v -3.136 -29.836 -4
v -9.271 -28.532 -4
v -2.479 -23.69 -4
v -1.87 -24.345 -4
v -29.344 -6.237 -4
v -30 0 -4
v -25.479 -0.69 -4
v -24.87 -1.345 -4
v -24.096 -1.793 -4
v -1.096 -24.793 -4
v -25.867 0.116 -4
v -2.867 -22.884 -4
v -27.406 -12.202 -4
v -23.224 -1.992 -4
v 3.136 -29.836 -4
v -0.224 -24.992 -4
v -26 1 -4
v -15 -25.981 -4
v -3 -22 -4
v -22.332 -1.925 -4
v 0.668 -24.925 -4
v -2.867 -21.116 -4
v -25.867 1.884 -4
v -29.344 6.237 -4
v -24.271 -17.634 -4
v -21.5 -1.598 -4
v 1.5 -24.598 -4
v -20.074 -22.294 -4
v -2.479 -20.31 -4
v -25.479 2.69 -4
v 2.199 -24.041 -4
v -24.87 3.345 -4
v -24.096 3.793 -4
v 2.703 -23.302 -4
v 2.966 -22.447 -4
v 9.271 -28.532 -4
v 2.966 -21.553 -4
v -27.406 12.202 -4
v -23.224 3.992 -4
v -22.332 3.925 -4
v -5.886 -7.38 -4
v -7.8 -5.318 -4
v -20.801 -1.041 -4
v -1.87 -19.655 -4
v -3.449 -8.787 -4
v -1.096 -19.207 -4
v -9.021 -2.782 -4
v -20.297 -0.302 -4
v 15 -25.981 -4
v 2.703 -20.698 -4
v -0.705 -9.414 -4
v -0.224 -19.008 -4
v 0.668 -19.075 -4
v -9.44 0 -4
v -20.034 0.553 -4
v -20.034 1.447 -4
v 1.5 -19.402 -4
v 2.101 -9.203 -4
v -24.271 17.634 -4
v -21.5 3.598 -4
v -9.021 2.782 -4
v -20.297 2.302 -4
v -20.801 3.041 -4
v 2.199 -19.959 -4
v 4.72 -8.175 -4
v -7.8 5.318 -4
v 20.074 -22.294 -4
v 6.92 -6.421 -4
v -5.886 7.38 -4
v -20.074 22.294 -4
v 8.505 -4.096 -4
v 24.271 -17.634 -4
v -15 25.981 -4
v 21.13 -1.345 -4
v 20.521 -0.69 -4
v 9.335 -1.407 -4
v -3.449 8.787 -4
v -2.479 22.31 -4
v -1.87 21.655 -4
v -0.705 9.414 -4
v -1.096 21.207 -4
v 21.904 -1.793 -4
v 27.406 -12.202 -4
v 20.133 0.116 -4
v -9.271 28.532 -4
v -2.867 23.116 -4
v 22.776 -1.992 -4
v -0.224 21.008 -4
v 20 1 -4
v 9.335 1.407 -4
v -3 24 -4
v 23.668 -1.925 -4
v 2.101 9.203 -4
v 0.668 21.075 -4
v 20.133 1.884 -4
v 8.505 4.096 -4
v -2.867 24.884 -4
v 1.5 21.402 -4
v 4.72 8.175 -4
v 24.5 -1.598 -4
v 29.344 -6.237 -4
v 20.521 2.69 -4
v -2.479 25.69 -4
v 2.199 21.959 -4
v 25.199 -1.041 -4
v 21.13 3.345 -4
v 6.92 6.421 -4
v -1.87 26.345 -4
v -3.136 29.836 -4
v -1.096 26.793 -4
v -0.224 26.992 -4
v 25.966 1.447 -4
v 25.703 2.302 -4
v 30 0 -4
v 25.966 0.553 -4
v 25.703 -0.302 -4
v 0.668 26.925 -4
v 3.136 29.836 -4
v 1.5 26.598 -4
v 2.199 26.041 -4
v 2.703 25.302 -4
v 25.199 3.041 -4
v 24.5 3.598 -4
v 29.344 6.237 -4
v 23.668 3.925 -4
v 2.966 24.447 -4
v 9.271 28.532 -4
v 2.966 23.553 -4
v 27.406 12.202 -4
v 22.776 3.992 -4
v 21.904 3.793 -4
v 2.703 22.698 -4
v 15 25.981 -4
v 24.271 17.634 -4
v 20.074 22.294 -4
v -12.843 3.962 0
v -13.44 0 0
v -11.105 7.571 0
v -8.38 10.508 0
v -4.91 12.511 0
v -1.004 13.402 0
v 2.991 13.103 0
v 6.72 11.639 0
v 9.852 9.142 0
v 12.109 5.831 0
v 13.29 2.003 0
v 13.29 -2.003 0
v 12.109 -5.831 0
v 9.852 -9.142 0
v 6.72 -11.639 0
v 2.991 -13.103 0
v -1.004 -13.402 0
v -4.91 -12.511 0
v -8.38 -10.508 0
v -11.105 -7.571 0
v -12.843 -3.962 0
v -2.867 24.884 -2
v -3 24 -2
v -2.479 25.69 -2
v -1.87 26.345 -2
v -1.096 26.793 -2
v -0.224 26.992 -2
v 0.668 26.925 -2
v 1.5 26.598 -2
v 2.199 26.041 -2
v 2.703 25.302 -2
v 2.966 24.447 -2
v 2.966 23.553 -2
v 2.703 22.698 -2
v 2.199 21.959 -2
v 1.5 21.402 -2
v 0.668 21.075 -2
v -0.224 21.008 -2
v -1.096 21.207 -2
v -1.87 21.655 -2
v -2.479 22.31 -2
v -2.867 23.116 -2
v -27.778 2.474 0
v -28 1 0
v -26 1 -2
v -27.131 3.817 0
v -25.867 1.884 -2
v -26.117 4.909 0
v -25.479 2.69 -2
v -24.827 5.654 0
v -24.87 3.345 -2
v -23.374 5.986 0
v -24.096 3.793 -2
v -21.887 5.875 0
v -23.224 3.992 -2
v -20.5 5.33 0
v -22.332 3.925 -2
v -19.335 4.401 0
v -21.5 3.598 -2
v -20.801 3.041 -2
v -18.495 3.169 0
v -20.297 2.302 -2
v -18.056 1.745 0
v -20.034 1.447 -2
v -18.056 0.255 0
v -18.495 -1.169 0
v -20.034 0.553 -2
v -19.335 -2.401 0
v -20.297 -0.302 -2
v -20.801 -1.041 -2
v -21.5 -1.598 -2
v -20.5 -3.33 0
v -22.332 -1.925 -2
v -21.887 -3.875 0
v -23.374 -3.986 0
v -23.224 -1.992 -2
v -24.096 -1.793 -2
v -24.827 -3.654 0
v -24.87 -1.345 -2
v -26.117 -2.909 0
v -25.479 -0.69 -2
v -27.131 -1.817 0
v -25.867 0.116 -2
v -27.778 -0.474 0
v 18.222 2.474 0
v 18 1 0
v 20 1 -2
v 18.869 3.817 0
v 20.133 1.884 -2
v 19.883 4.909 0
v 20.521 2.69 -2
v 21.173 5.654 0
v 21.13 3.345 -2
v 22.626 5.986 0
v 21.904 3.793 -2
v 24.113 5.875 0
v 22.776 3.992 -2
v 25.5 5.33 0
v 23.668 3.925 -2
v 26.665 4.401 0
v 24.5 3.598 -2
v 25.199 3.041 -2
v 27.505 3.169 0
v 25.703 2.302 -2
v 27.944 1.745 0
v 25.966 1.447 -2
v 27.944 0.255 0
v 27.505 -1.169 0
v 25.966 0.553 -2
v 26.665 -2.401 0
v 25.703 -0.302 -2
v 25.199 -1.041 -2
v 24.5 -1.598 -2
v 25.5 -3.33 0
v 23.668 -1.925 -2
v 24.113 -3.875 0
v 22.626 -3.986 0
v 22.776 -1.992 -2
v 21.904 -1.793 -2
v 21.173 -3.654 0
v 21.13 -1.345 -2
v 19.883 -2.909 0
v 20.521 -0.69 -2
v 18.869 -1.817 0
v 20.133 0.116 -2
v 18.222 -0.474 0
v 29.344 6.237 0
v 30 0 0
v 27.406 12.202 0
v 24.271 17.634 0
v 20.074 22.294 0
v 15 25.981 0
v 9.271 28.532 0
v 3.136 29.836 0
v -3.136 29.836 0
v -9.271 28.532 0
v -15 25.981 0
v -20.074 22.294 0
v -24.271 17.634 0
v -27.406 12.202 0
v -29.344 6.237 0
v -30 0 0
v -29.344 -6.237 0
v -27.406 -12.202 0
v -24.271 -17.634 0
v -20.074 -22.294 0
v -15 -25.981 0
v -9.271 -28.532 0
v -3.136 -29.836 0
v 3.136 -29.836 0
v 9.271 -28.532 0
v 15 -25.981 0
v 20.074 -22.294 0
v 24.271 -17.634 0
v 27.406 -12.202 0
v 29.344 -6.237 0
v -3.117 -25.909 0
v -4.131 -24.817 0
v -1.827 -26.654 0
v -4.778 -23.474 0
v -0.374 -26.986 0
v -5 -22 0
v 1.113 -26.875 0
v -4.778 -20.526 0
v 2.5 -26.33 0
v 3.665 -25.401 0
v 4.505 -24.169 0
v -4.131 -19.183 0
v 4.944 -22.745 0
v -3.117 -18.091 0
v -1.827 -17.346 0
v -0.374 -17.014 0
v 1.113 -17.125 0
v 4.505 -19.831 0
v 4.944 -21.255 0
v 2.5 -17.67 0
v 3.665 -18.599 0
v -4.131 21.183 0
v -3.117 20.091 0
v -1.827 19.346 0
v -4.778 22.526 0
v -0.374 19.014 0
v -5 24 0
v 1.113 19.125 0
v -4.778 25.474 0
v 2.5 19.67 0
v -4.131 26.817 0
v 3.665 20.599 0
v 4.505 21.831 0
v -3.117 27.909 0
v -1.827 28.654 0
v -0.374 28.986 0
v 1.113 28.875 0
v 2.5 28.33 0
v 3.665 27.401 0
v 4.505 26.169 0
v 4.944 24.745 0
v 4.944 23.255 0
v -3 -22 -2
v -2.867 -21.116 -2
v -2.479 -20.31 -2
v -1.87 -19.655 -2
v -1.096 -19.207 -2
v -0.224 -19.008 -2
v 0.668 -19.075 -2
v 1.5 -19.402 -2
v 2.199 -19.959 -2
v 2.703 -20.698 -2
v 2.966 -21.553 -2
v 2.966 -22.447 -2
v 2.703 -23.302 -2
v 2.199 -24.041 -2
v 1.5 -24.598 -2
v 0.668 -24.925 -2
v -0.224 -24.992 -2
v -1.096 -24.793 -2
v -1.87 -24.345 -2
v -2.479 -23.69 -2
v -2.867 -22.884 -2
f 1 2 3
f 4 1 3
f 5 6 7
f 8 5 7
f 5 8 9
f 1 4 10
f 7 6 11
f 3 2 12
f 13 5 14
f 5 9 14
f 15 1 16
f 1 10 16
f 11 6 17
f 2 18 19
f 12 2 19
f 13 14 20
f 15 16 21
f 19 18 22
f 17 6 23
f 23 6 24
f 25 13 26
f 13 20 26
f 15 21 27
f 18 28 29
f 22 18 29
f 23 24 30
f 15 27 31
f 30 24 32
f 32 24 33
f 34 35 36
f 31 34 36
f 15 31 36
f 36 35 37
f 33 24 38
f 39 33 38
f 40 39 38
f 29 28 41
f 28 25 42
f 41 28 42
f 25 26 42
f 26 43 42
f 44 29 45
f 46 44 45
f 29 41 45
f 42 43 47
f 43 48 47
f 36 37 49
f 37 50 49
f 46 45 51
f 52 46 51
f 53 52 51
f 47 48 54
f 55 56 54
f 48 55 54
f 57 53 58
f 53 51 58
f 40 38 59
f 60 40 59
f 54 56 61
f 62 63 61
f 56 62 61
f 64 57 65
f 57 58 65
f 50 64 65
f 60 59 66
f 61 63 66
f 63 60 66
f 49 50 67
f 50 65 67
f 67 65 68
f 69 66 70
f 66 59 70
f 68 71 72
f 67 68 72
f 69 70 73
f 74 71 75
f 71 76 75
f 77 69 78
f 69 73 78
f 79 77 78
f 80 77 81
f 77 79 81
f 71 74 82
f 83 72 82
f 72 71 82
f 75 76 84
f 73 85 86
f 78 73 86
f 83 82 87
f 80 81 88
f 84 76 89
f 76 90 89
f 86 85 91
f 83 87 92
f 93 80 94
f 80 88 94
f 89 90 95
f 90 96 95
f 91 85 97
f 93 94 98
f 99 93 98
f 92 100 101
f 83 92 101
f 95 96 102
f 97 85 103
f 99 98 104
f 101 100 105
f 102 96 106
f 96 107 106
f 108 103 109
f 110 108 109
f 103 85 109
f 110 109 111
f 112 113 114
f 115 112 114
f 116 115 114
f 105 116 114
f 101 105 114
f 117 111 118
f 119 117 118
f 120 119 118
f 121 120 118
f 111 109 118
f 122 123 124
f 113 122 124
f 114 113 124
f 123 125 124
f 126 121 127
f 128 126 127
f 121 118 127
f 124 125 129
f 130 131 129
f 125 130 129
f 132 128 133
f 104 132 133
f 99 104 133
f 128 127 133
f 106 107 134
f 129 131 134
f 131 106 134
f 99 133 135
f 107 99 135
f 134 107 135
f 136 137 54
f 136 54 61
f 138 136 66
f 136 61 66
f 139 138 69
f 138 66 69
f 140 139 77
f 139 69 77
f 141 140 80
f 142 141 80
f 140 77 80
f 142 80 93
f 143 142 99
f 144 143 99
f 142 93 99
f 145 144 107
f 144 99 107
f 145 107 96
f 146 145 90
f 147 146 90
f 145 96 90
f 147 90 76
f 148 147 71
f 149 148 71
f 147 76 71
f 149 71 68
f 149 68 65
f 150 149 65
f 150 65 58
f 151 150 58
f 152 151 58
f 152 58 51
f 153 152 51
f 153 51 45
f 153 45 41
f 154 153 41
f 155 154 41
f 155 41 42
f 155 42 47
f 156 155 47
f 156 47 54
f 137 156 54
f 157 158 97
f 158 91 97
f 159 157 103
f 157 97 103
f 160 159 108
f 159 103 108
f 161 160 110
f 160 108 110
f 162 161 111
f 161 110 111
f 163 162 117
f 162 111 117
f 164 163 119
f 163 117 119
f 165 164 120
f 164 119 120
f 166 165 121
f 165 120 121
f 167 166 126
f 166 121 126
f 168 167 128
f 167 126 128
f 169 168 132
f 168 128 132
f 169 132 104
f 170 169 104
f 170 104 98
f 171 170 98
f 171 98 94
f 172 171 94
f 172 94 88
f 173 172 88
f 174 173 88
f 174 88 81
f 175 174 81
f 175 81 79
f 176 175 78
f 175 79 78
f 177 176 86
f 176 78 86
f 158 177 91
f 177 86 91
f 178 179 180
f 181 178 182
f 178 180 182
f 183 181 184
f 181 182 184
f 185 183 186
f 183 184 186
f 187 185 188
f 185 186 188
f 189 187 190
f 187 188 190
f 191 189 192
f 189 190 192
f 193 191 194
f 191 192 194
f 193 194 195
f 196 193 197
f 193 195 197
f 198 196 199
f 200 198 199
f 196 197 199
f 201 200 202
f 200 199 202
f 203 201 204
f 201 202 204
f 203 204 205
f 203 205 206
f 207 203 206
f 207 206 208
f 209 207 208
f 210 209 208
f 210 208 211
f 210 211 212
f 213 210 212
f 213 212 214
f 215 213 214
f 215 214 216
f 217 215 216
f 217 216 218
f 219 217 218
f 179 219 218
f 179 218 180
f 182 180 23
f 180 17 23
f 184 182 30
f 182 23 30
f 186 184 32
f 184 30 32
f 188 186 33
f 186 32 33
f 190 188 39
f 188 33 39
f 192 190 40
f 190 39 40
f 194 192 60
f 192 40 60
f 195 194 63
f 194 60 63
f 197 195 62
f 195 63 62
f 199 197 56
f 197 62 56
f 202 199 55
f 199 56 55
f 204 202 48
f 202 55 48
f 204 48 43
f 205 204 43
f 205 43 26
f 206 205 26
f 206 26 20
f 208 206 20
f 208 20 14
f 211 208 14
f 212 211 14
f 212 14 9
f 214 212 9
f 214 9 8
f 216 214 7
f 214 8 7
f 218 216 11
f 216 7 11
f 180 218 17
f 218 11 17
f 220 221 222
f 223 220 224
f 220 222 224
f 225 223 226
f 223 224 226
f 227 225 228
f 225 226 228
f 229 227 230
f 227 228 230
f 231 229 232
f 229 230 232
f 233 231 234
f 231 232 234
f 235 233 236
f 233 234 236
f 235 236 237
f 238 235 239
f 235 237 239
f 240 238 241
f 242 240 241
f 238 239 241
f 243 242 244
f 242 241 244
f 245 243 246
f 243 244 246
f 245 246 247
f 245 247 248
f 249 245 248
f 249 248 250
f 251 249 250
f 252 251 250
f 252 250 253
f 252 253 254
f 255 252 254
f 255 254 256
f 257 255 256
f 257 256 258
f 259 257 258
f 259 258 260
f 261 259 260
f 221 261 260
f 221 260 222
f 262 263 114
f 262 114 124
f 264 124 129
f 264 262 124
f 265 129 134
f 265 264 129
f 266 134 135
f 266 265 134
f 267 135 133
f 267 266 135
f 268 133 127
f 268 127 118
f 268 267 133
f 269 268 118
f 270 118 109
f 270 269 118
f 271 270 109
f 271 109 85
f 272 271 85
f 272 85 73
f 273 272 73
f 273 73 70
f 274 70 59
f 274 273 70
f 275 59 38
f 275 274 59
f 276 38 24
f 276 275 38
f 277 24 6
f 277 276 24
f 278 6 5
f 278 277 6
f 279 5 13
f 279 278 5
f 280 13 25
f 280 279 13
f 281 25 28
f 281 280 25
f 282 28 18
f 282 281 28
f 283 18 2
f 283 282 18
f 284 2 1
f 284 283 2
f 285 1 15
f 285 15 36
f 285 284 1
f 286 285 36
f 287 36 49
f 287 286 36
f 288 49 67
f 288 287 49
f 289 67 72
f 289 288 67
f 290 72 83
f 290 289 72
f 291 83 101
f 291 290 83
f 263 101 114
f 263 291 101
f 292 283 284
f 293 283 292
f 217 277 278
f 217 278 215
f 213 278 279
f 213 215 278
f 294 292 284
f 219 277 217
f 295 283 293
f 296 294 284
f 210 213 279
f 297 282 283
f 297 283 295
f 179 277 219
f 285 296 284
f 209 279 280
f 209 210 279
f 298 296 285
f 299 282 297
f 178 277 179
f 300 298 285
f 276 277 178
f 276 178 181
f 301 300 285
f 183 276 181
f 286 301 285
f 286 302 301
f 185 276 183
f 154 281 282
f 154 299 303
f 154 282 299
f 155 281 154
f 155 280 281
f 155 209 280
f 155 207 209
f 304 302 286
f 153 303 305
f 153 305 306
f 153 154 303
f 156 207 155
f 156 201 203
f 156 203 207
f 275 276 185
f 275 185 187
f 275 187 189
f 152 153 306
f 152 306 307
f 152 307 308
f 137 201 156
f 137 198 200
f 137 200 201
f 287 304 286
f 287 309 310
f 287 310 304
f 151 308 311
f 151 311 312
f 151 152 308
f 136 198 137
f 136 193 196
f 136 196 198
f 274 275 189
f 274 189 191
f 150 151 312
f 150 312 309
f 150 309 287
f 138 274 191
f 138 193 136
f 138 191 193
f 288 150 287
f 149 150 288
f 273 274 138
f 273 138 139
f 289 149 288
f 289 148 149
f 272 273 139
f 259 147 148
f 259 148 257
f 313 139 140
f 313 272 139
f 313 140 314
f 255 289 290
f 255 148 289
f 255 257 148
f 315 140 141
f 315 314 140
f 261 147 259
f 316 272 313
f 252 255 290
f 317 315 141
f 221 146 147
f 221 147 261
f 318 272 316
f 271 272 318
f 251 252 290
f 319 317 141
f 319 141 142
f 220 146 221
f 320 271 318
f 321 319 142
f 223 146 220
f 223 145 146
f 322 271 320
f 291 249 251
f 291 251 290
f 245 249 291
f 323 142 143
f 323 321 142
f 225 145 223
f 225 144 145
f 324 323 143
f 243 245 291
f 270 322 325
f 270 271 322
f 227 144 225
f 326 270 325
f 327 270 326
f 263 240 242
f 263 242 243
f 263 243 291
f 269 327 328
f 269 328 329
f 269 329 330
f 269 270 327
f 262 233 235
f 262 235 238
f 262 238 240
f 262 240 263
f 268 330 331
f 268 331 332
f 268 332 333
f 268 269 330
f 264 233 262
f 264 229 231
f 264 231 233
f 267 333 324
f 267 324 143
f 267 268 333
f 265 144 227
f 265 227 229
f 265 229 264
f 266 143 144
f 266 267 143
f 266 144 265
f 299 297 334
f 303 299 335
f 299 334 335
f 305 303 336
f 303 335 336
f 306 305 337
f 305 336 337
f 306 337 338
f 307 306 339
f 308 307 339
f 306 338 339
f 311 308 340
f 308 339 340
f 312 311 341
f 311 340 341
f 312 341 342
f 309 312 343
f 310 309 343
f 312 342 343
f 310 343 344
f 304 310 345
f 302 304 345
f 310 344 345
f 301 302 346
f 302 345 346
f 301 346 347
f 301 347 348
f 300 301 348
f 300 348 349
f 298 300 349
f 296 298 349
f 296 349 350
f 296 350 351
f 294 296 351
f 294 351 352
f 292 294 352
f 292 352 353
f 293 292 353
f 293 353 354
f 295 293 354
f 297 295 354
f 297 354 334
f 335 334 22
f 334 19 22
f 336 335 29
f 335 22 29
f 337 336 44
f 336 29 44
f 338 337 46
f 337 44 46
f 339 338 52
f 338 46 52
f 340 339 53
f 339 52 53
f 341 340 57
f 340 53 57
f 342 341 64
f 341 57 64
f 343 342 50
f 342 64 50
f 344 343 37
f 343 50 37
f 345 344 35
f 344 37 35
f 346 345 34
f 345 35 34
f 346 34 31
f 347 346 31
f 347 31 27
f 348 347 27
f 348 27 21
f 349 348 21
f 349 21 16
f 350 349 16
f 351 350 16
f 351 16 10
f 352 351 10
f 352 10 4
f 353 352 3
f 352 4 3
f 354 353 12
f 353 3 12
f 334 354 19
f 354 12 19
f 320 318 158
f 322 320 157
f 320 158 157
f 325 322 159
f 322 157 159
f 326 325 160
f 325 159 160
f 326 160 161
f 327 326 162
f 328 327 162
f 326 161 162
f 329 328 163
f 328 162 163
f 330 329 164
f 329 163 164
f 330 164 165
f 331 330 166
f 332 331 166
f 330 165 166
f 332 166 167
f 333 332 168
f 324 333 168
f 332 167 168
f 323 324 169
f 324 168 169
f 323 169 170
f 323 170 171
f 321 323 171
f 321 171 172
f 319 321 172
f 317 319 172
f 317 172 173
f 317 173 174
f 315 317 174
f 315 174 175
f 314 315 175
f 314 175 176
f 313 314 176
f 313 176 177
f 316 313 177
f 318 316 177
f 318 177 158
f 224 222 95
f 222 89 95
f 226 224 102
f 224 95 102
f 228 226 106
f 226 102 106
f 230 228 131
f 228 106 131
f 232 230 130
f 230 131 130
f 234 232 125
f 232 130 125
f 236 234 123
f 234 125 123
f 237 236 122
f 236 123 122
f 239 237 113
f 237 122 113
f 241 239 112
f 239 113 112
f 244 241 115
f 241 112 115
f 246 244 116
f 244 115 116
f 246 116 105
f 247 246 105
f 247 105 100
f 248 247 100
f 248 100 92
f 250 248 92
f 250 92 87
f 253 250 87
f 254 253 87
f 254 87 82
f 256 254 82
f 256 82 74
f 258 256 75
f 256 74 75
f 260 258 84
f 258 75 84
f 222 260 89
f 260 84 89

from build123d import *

# Parameters (mm, degrees)
F0_R           = 30
F1_DEPTH       = 4
F3_D           = 13.2
F3_DEPTH       = 12
F3_CSINK_D     = 26.88
F3_CSINK_ANGLE = 90
F3_TIP         = 3.9656800856
F5_D           = 6
F5_DEPTH       = 12
F5_CSINK_D     = 10
F5_CSINK_ANGLE = 90
F5_TIP         = 1.8025818571


with BuildPart() as f1:
    # F0 (on Top) → F1 (new body)
    with BuildSketch(Plane.XY):
        Circle(F0_R)
    extrude(amount=-F1_DEPTH)

    # F3
    with Locations(Plane.XY):
        with Locations((0, 0)):
            CounterSinkHole(F3_D / 2, F3_CSINK_D / 2, depth=F3_DEPTH, counter_sink_angle=F3_CSINK_ANGLE)
            with Locations((0, 0, -(F3_DEPTH + F3_TIP / 2))):  # 118° drill point
                Cone(0, F3_D / 2, F3_TIP, mode=Mode.SUBTRACT)

    # F5
    with Locations(Plane.XY):
        with Locations((-23, 1), (0, 24), (23, 1), (0, -22)):
            CounterSinkHole(F5_D / 2, F5_CSINK_D / 2, depth=F5_DEPTH, counter_sink_angle=F5_CSINK_ANGLE)
            with Locations((0, 0, -(F5_DEPTH + F5_TIP / 2))):  # 118° drill point
                Cone(0, F5_D / 2, F5_TIP, mode=Mode.SUBTRACT)


solid = f1.part
